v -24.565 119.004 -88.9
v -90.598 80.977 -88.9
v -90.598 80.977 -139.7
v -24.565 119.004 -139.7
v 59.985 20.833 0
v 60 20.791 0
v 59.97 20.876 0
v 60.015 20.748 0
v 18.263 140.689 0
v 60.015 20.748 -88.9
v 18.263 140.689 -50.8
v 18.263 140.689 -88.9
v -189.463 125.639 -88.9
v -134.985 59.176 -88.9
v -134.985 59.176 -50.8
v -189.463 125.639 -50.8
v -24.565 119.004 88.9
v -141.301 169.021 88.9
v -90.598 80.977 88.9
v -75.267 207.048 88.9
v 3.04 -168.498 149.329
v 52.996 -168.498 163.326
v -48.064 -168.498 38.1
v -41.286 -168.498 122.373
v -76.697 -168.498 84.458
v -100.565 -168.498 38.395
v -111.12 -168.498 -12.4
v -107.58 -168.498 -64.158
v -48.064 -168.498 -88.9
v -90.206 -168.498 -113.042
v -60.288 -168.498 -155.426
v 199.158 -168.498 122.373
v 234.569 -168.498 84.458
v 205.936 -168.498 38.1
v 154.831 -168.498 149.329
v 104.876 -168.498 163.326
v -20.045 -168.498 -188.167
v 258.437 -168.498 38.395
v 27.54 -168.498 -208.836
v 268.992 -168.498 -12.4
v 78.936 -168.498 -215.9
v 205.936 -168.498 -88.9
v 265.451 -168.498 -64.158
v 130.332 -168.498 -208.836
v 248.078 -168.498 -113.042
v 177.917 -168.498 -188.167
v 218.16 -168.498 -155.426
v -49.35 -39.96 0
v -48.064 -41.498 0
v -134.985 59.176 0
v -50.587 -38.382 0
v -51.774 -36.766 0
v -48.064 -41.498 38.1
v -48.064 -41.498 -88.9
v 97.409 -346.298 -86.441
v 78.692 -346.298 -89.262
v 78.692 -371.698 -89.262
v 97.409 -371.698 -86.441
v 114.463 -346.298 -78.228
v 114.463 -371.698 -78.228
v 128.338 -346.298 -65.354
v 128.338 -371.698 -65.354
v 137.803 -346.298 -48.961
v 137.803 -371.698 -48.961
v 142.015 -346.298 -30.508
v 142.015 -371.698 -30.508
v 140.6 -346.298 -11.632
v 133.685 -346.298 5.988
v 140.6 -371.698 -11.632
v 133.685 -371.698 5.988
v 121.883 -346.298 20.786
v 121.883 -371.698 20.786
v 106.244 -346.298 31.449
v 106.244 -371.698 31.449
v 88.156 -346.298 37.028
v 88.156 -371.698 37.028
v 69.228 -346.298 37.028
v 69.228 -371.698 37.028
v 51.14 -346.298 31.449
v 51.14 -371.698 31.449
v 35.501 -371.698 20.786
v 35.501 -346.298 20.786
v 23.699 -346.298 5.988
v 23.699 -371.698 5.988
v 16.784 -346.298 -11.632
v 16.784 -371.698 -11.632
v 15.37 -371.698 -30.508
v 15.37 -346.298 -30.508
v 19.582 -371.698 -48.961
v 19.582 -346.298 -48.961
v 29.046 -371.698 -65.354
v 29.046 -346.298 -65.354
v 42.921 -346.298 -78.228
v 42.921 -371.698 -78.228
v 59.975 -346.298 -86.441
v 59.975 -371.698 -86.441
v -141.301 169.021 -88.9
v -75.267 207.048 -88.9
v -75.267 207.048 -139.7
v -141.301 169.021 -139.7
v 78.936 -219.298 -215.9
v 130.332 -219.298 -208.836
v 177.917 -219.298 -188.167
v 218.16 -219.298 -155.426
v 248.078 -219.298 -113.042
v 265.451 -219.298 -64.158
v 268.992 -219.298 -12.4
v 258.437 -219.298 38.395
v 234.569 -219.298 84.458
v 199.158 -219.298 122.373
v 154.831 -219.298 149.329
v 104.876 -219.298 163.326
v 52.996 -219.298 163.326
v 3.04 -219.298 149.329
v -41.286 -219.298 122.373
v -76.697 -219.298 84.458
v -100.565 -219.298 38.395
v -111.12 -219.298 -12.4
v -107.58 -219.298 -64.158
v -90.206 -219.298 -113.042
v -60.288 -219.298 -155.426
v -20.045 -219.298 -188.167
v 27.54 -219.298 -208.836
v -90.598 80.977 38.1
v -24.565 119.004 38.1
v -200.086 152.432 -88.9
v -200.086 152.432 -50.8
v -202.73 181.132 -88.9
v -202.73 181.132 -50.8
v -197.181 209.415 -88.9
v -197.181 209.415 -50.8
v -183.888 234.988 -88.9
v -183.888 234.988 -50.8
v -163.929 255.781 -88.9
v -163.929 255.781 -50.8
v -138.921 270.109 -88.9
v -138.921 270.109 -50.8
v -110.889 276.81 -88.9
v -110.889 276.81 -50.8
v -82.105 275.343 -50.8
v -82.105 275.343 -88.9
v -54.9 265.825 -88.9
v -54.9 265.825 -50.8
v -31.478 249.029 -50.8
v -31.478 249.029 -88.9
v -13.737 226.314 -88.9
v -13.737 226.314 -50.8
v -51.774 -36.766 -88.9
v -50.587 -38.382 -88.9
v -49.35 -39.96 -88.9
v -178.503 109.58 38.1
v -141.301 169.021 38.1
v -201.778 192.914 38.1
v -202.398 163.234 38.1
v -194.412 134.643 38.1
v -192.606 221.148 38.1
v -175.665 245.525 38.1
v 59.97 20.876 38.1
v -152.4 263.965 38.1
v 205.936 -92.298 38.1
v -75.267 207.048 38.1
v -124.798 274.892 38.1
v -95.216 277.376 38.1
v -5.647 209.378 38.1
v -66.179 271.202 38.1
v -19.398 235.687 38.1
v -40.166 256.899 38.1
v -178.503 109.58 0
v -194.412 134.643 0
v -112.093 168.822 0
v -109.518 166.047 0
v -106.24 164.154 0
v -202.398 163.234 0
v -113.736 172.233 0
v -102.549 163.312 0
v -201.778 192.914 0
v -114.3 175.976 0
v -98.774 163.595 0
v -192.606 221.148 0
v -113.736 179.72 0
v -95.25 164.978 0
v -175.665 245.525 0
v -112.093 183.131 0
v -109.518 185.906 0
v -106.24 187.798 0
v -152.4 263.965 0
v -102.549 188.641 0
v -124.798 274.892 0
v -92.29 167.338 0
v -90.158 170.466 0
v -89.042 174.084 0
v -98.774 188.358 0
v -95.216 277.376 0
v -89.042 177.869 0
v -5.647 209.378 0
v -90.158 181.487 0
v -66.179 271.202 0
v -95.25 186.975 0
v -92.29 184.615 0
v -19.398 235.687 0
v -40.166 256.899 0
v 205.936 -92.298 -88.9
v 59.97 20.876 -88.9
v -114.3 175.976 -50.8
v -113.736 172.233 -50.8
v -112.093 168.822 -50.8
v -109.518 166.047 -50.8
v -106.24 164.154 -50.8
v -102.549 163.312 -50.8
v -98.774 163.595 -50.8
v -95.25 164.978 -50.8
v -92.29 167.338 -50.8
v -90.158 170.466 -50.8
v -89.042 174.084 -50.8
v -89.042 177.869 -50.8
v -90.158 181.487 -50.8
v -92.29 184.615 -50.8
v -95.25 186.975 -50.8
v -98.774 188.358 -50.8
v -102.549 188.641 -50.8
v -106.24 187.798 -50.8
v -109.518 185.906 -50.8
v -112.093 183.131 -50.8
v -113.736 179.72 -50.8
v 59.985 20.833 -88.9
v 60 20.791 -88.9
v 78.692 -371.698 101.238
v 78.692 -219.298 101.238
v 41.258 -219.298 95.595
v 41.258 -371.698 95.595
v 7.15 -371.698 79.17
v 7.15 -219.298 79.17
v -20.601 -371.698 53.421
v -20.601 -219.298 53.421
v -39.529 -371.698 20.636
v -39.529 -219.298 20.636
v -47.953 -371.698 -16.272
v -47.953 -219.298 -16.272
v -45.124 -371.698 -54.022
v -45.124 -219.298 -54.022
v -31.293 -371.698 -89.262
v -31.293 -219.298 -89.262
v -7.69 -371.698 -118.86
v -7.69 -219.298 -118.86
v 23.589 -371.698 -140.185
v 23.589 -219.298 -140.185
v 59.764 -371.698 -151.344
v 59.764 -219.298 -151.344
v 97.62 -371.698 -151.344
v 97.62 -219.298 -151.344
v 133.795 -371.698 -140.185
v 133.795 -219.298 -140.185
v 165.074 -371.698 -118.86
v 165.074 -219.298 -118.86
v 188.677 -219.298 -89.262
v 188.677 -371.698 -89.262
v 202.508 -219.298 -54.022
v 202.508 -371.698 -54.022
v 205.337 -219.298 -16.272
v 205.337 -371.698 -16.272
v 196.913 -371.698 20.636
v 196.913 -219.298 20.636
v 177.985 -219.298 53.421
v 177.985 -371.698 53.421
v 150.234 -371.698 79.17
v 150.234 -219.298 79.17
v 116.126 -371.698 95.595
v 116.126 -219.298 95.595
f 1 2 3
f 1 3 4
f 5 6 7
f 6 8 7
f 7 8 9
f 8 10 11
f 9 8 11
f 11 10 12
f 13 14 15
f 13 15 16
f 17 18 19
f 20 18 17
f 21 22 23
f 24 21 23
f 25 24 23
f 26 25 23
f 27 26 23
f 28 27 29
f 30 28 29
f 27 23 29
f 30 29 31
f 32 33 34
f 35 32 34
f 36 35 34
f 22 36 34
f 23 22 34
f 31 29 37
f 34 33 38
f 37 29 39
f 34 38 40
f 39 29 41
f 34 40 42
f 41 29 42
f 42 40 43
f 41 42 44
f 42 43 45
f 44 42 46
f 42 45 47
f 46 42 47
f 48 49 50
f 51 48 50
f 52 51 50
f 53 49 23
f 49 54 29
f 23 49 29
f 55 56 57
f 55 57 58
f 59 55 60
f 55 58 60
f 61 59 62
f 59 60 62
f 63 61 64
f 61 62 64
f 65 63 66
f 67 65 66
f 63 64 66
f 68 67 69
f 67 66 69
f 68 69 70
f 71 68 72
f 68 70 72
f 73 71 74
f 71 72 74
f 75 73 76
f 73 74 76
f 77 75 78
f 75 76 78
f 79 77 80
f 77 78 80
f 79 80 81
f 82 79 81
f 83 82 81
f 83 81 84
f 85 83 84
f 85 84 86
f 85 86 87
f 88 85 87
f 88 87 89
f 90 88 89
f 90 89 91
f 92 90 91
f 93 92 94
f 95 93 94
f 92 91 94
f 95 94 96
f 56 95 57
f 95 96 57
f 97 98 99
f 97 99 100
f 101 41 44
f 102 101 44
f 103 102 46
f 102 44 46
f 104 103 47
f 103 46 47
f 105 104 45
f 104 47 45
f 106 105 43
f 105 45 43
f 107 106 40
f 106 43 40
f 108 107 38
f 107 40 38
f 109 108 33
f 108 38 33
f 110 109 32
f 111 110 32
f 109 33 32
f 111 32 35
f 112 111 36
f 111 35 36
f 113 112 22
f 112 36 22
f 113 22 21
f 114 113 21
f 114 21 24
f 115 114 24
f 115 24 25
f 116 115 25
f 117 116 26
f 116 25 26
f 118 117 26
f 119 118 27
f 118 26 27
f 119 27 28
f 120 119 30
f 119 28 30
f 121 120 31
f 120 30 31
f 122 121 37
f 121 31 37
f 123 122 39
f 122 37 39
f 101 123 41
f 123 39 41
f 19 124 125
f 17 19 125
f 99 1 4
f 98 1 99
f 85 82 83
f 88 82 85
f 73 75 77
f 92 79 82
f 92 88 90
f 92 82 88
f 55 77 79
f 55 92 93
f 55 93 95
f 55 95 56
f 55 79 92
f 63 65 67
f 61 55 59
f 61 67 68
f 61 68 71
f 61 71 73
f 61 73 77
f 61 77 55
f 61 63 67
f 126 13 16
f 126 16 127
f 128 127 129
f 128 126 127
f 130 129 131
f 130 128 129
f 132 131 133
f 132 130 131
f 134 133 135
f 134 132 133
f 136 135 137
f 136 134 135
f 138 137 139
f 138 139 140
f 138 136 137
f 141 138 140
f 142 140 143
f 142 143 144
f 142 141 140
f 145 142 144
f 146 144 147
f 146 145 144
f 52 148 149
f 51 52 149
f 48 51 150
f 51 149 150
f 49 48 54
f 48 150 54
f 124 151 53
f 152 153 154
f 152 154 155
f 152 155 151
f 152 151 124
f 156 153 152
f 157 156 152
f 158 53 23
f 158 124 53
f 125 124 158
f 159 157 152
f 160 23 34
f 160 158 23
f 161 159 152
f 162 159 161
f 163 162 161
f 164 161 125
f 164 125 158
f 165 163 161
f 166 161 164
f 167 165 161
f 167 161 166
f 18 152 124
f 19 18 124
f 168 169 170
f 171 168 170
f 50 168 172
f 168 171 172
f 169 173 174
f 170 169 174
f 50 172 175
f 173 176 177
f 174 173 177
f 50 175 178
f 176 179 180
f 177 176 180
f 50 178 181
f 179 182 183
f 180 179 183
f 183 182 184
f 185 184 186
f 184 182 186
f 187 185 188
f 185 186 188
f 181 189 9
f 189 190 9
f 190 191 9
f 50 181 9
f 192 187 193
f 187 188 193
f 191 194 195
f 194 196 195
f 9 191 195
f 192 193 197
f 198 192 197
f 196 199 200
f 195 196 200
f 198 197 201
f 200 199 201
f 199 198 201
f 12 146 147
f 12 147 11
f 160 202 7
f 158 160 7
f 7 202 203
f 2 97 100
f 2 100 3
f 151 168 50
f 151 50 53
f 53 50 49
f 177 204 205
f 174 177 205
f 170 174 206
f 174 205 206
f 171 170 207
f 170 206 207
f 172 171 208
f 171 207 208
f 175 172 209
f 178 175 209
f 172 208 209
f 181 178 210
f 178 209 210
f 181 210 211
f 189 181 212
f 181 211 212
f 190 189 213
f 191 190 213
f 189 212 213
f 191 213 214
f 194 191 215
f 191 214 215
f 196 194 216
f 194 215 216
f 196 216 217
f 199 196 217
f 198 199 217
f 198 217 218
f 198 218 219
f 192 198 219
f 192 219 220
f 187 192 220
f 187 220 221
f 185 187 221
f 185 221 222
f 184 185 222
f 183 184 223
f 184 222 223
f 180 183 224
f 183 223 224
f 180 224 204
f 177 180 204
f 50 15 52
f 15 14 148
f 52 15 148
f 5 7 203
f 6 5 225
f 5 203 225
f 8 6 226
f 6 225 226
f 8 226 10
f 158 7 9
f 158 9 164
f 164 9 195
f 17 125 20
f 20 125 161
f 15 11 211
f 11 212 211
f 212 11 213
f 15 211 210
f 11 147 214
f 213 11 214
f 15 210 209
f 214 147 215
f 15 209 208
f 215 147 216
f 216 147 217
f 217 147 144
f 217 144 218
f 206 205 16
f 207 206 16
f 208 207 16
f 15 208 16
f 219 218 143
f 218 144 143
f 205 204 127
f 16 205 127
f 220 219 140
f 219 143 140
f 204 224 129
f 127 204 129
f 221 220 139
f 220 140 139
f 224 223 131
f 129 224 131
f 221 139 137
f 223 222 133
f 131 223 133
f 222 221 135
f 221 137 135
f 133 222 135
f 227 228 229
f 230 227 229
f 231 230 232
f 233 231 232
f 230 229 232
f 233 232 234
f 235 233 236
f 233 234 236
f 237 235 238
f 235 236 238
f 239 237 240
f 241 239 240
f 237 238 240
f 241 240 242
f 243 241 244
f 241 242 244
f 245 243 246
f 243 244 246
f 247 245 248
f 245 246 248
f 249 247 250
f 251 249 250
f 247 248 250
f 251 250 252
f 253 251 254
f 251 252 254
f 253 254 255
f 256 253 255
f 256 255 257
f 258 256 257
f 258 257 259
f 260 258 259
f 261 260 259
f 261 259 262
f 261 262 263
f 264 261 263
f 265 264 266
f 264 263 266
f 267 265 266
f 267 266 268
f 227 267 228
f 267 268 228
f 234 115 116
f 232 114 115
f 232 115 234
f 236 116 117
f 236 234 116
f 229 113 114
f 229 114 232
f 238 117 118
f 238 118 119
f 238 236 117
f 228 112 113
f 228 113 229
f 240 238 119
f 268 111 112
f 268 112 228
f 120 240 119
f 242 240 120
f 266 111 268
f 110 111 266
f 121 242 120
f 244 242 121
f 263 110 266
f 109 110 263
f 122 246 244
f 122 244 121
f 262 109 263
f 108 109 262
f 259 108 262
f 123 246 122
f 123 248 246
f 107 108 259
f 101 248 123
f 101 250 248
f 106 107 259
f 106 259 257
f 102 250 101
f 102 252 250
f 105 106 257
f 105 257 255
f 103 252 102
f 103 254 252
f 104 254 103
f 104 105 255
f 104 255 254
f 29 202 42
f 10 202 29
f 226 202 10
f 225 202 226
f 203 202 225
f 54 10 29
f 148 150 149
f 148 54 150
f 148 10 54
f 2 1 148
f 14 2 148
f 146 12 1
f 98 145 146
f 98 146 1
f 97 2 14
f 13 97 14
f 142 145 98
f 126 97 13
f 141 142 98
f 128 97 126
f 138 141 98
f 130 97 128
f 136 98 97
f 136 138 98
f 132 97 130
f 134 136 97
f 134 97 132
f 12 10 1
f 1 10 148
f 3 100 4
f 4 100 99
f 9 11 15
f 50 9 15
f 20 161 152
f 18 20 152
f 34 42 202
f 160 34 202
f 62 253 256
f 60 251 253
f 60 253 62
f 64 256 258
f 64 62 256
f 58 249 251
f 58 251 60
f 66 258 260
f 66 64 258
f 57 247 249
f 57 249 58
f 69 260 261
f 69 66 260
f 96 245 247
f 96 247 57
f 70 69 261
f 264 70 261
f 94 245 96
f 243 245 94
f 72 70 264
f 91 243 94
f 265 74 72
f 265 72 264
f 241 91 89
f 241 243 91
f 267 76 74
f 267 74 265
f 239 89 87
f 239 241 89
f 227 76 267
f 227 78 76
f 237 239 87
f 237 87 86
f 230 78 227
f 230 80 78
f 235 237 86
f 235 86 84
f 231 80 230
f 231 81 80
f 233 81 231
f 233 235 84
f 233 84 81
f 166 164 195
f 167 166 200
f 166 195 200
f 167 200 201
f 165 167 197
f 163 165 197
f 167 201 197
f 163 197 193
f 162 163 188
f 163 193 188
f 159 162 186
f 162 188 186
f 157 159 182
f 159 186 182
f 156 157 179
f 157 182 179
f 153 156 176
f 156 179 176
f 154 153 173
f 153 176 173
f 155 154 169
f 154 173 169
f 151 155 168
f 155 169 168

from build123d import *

# Parameters (mm, degrees)
BOSS_EXTRUDE3_DEPTH  = 38.1
BOSS_EXTRUDE4_START  = -38.1
SKETCH2_R            = 101.6
SKETCH2_R_2          = 63.5
BOSS_EXTRUDE4_DEPTH  = 38.1
BOSS_EXTRUDE5_START  = -127
BOSS_EXTRUDE5_DEPTH  = 127
BOSS_EXTRUDE7_START  = 88.9
BOSS_EXTRUDE7_DEPTH  = 88.9
BOSS_EXTRUDE8_DEPTH  = 38.1
SKETCH9_R            = 190.5
BOSS_EXTRUDE9_DEPTH  = 50.8
SKETCH15_R           = 127
BOSS_EXTRUDE10_DEPTH = 152.4
SKETCH16_R           = 12.7
BOSS_EXTRUDE11_DEPTH = 50.8
SKETCH17_R           = 63.5
CUT_EXTRUDE1_DEPTH   = 25.4
BOSS_EXTRUDE12_DEPTH = 50.8


with BuildPart() as part:
    # Sketch1 → Boss-Extrude3 (new body)
    with BuildSketch(Plane.XY):
        with BuildLine():
            ThreePointArc((0, 175.976362049), (-66.179327011, 80.750651629), (-178.502675689, 109.579536282))
            Line((-178.502675689, 109.579536282), (-48.064172306, -41.498016104))
            ThreePointArc((-48.064172306, -41.498016104), (-31.75, 54.99261314), (59.970422306, 20.875786176))
            Line((59.970422306, 20.875786176), (-5.647324311, 209.377619931))
            ThreePointArc((-5.647324311, 209.377619931), (-1.421779188, 192.914014631), (0, 175.976362049))
        make_face()
    extrude(amount=BOSS_EXTRUDE3_DEPTH)

    # Sketch2 → Boss-Extrude4 (add)
    with BuildSketch(Plane.XY.offset(38.1).offset(BOSS_EXTRUDE4_START)):
        with Locations((-101.6, 175.976362049)):
            Circle(SKETCH2_R)
        Circle(SKETCH2_R_2)
    extrude(amount=BOSS_EXTRUDE4_DEPTH)

    # Sketch3 → Boss-Extrude5 (add)
    with BuildSketch(Plane.XY.offset(38.1).offset(BOSS_EXTRUDE5_START)):
        with BuildLine():
            Line((-48.064172306, -41.498016104), (-48.064172306, -168.498016104))
            Line((-48.064172306, -168.498016104), (205.935827694, -168.498016104))
            Line((205.935827694, -168.498016104), (205.935827694, -92.298016104))
            Line((205.935827694, -92.298016104), (59.970422306, 20.875786176))
            ThreePointArc((59.970422306, 20.875786176), (31.75, -54.99261314), (-48.064172306, -41.498016104))
        make_face()
    extrude(amount=BOSS_EXTRUDE5_DEPTH)

    # Sketch4 → Boss-Extrude7 (add)
    with BuildSketch(Plane(origin=(0, 0, 0), x_dir=(-1, 0, 0), z_dir=(0, 0, -1)).offset(BOSS_EXTRUDE7_START)):
        with BuildLine():
            Line((-60.014697878, 20.748157474), (-18.263261234, 140.689049326))
            Line((-18.263261234, 140.689049326), (134.985164693, 59.176328053))
            Line((134.985164693, 59.176328053), (51.773850531, -36.765723184))
            ThreePointArc((51.773850531, -36.765723184), (-29.050636969, -56.465126332), (-60.014697878, 20.748157474))
        make_face()
    extrude(amount=-BOSS_EXTRUDE7_DEPTH)

    # Sketch11 → Boss-Extrude8 (add)
    with BuildSketch(Plane(origin=(0, 0, -88.9), x_dir=(-1, 0, 0), z_dir=(0, 0, -1))):
        with BuildLine():
            Line((13.737038838, 226.313954509), (-18.263261234, 140.689049326))
            Line((-18.263261234, 140.689049326), (134.985164693, 59.176328053))
            Line((134.985164693, 59.176328053), (189.462961162, 125.638769589))
            ThreePointArc((189.462961162, 125.638769589), (151.93759246, 263.839323211), (13.737038838, 226.313954509))
        make_face()
    extrude(amount=-BOSS_EXTRUDE8_DEPTH)

    # Sketch9 → Boss-Extrude9 (add)
    with BuildSketch(Plane(origin=(0, -168.498016104, 0), x_dir=(-1, 0, 0), z_dir=(0, -1, 0))):
        with Locations(Location((-78.935827694, 25.4, 0), (0, 0, 90))):
            Circle(SKETCH9_R)
    extrude(amount=BOSS_EXTRUDE9_DEPTH)

    # Sketch15 → Boss-Extrude10 (add)
    with BuildSketch(Plane.XZ.offset(219.298016104)):
        with Locations(Location((78.692071522, -25.762296975, 0), (0, 0, 90))):
            Circle(SKETCH15_R)
    extrude(amount=BOSS_EXTRUDE10_DEPTH)

    # Sketch16 → Boss-Extrude11 (add)
    with BuildSketch(Plane.XY.offset(-50.8)):
        with Locations(Location((-101.6, 175.976362049, 0), (0, 0, 180))):
            Circle(SKETCH16_R)
    extrude(amount=BOSS_EXTRUDE11_DEPTH)

    # Sketch17 → Cut-Extrude1 (cut)
    with BuildSketch(Plane.XZ.offset(371.698016104)):
        with Locations(Location((78.692071522, -25.762296975, 0), (0, 0, 270))):
            Circle(SKETCH17_R)
    extrude(amount=-CUT_EXTRUDE1_DEPTH, mode=Mode.SUBTRACT)

    # Sketch19 → Boss-Extrude12 (add)
    with BuildSketch(Plane.XY.offset(38.1)):
        Polygon((-24.564880981, 119.003650496), (-75.267213011, 207.048147921), (-141.300586079, 169.021398898), (-90.598254049, 80.976901474), align=None)
    boss_extrude12 = extrude(amount=BOSS_EXTRUDE12_DEPTH)

    # Mirror1: Boss-Extrude12 across plane
    add(boss_extrude12.mirror(Plane(origin=(0, 0, -25.4), x_dir=(1, 0, 0), z_dir=(0, 0, -1))))


solid = part.part
